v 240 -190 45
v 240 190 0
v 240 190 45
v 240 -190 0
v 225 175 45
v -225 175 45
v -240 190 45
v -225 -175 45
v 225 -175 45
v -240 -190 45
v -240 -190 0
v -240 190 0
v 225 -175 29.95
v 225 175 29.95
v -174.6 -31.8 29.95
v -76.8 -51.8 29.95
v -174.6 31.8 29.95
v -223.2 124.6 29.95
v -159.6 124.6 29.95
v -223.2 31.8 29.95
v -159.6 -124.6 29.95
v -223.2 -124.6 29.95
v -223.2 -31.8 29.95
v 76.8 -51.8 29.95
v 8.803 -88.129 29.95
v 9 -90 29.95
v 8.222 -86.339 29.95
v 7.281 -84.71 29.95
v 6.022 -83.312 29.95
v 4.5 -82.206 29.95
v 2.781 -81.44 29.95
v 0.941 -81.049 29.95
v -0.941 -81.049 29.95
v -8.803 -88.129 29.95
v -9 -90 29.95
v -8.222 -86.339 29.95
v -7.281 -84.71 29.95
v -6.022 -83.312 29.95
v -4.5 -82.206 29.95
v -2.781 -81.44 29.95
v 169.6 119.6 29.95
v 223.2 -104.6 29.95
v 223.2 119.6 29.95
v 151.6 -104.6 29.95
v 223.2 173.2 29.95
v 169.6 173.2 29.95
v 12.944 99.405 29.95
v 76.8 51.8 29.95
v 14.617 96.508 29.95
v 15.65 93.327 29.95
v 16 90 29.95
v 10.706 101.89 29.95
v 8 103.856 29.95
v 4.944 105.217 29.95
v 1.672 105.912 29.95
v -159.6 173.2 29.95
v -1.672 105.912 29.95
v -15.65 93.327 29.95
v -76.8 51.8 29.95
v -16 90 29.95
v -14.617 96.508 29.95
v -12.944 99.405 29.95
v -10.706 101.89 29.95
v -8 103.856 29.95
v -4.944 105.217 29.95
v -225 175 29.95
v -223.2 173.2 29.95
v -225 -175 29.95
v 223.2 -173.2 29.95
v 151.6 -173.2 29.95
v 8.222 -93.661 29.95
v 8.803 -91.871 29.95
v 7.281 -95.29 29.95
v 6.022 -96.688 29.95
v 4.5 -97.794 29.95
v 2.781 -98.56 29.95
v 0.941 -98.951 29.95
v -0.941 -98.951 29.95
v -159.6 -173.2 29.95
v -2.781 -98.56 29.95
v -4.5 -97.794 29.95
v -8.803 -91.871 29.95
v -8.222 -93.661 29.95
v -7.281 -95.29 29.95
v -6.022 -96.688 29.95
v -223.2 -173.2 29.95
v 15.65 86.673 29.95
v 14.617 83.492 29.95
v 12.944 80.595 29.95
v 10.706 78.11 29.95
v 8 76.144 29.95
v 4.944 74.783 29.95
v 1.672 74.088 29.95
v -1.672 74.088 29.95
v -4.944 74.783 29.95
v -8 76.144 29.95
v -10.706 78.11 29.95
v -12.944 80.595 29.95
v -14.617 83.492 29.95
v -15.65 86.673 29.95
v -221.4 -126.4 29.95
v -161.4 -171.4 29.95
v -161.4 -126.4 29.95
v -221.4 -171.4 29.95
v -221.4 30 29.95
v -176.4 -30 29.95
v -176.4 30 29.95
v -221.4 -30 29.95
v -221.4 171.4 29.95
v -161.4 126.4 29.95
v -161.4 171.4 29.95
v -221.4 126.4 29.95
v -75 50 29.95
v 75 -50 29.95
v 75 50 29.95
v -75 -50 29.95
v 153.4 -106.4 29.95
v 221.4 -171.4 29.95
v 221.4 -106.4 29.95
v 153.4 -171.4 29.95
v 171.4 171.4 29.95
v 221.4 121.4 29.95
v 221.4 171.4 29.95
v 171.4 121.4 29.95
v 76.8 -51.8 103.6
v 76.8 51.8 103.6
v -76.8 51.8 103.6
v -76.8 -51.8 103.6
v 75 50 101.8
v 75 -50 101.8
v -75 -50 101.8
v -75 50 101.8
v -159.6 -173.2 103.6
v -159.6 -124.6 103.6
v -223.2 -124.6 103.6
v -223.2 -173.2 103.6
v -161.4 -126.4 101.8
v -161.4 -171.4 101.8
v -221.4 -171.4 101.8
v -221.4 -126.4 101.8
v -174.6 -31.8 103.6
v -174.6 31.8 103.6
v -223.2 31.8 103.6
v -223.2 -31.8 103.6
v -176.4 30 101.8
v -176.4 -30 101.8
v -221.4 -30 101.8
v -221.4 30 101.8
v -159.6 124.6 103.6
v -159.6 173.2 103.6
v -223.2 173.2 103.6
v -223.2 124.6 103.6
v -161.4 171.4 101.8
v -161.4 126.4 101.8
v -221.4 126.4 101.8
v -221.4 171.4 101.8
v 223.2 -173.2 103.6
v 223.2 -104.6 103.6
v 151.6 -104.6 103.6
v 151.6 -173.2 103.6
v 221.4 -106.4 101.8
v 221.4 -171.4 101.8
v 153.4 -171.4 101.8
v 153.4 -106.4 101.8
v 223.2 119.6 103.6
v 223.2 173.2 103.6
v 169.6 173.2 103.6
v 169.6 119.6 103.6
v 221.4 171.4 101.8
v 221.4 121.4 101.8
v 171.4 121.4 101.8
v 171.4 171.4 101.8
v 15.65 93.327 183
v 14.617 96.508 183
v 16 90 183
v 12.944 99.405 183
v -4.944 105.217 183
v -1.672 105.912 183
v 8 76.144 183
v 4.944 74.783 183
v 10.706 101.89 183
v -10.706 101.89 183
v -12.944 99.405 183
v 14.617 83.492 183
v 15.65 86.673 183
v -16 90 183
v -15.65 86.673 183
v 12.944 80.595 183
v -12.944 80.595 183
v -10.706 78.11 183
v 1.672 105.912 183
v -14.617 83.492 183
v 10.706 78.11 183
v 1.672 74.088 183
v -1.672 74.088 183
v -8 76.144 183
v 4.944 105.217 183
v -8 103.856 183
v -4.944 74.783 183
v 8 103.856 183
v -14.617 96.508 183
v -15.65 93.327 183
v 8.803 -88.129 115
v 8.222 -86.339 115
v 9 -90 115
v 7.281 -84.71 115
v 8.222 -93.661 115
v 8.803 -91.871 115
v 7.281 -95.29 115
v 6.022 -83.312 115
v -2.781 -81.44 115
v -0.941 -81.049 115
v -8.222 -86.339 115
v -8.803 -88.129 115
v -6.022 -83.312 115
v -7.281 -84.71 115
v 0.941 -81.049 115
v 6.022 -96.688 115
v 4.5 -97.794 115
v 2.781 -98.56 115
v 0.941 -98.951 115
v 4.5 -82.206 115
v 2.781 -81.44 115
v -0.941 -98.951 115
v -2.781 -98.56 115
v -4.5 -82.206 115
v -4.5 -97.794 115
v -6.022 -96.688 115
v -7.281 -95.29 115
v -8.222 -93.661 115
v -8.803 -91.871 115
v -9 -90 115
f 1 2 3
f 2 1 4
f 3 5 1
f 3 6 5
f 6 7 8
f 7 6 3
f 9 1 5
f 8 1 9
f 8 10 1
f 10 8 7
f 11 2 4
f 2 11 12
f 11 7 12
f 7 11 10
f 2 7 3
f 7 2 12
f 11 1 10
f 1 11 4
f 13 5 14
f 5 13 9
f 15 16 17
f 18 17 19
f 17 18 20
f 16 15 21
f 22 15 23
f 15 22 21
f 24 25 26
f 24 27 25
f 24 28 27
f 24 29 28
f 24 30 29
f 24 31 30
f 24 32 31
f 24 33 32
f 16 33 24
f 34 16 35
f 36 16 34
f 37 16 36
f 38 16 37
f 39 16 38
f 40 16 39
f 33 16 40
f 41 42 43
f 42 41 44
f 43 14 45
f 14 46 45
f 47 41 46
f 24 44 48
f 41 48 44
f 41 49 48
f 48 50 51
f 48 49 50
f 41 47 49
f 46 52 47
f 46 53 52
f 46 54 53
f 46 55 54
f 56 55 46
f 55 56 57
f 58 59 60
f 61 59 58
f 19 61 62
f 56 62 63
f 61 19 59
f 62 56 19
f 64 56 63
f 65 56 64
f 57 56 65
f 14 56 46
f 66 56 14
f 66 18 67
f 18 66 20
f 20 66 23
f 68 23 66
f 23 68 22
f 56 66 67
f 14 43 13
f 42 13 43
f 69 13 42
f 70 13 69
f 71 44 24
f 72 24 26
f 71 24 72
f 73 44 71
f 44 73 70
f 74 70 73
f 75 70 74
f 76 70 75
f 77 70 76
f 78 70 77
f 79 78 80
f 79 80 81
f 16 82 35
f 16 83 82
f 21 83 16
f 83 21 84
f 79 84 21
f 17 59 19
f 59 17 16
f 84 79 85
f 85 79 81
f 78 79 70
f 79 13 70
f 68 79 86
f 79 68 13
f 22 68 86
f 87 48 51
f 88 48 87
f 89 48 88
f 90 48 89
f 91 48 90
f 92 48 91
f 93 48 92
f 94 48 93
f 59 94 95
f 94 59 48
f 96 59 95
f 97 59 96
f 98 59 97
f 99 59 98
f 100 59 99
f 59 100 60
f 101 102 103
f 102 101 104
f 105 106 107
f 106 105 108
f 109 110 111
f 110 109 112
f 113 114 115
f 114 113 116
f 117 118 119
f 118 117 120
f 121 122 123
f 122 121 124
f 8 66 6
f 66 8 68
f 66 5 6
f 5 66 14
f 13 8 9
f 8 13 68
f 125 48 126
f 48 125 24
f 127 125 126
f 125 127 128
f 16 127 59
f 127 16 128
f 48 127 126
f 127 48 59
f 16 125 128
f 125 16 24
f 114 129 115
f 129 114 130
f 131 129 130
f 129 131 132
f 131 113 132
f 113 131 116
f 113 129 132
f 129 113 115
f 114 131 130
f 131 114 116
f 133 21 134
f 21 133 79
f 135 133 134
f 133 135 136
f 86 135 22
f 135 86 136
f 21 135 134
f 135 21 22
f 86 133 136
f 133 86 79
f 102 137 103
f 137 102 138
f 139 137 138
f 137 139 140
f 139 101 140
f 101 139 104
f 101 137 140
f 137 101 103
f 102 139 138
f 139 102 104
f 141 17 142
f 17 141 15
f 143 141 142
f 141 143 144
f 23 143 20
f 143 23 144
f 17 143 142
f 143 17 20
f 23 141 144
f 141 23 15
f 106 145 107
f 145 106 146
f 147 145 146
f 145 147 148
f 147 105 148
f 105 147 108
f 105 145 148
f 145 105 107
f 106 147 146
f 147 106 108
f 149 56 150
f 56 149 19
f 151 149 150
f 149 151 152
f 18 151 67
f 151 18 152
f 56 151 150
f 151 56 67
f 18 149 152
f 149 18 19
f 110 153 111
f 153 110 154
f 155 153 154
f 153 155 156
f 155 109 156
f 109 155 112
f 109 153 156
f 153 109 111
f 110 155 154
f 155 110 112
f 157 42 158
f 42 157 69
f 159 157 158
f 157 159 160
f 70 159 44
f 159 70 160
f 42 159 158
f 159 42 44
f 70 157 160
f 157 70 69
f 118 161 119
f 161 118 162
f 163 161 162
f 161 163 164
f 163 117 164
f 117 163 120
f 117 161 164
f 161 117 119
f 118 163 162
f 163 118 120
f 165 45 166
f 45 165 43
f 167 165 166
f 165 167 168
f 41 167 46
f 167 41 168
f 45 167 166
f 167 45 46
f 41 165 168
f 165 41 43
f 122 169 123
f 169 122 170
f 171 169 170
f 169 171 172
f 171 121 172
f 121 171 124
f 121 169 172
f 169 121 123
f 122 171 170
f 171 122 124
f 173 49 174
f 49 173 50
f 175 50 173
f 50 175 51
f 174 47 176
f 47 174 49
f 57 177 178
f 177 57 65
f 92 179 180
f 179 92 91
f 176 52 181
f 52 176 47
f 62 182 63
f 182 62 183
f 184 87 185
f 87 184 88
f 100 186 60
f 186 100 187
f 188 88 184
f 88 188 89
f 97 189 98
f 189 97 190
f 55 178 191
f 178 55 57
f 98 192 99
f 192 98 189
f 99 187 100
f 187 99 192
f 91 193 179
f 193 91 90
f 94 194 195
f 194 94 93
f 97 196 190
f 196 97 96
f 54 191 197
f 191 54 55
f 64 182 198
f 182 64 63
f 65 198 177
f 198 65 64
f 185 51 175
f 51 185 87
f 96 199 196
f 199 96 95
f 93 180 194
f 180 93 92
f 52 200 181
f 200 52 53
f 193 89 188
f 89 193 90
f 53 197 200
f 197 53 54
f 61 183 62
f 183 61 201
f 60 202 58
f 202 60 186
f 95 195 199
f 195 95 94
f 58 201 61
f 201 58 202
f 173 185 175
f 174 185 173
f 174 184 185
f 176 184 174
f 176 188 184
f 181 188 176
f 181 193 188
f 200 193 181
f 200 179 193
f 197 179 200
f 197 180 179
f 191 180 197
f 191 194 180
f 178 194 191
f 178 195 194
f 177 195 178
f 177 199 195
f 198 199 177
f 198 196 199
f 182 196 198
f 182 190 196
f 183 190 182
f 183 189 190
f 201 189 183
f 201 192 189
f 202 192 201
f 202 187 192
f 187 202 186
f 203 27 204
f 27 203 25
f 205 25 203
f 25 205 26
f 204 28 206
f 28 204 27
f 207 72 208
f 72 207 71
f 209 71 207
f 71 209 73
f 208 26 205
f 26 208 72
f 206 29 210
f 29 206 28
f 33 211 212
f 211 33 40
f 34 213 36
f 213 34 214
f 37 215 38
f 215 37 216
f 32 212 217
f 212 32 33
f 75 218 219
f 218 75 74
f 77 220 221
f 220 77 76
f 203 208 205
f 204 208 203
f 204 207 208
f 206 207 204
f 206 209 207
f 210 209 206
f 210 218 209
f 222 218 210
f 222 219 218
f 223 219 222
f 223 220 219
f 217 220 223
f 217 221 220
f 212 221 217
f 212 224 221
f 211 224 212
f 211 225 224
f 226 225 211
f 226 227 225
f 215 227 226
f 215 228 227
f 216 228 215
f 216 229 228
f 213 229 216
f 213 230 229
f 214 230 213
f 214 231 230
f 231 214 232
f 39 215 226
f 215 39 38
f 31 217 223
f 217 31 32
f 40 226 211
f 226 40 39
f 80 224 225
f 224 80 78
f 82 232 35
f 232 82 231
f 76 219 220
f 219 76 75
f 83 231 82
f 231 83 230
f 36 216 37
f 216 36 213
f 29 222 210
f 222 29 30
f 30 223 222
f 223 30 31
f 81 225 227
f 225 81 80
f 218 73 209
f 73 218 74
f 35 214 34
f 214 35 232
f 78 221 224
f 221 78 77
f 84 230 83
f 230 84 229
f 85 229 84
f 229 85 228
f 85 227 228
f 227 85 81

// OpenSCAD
scaleFactor = 10;

roomWidth = 3500;
roomLength = 4500;
roomHeight = 150;
roomWallThickness = 150;

module box(width, length, height, wallThickness, open = "top") {    
    // inner core in the center, equals to open == "none"
    innerHeight = open == "bottom" ? height+1 : (open == "top" ? height+1 : height);
    innerZ = open == "bottom" ? -wallThickness : (open == "top" ? wallThickness : 0);

    translate([0, 0, height / 2 + wallThickness])
    difference() {
        cube(size = [length + 2 * wallThickness, width + 2 * wallThickness, height + 2 * wallThickness], center = true);
        translate([0, 0, innerZ])
            cube(size = [length, width, innerHeight], center = true);
    }
}

scale([1 / scaleFactor, 1 / scaleFactor, 1 / scaleFactor]) {
    // room
    box(width = roomWidth, length = roomLength, height = roomHeight, wallThickness = roomWallThickness);

    // workbench in the middle
    box(width = 1000, length = 1500, height = 1000, wallThickness = 18, open = "none" );

    // Sharping station
    boxWidth = 450;
    boxLength = 600;
    boxWallThickness = 18;
    totallyRight = roomWidth / 2 - boxWidth / 2 - 2 * boxWallThickness;
    tottalyFront = roomLength / 2 - boxLength / 2 - 2 * boxWallThickness;
    translate([-tottalyFront, -totallyRight, 0]) box(width = boxWidth, length = boxLength, height = 1000, wallThickness = boxWallThickness, open = "none" );

    // Drill station
    boxWidth1 = 600;
    boxLength1 = 450;
    boxWallThickness1 = 18;
    totallyRight1 = roomWidth / 2 - boxWidth1 / 2 - 2 * boxWallThickness1;
    tottalyFront1 = roomLength / 2 - boxLength1 / 2 - 2 * boxWallThickness1;
    translate([-tottalyFront1, 0, 0]) box(width = boxWidth1, length = boxLength1, height = 1000, wallThickness = boxWallThickness1, open = "none" );

    // Mitre station
    boxWidth2 = 450;
    boxLength2 = 600;
    boxWallThickness2 = 18;
    totallyRight2 = roomWidth / 2 - boxWidth2 / 2 - 2 * boxWallThickness2;
    tottalyFront2 = roomLength / 2 - boxLength2 / 2 - 2 * boxWallThickness2;
    translate([-tottalyFront2, totallyRight2, 0]) box(width = boxWidth2, length = boxLength2, height = 1000, wallThickness = boxWallThickness2, open = "none" );

    // Saw station
    boxWidth3 = 650;
    boxLength3 = 680;
    boxWallThickness3 = 18;
    totallyRight3 = roomWidth / 2 - boxWidth3 / 2 - 2 * boxWallThickness3;
    tottalyFront3 = roomLength / 2 - boxLength3 / 2 - 2 * boxWallThickness3;
    translate([tottalyFront3, -totallyRight3, 0]) box(width = boxWidth3, length = boxLength3, height = 1000, wallThickness = boxWallThickness3, open = "none" );

    // Dust station
    boxWidth4 = 500;
    boxLength4 = 500;
    boxWallThickness4 = 18;
    totallyRight4 = roomWidth / 2 - boxWidth4 / 2 - 2 * boxWallThickness4;
    tottalyFront4 = roomLength / 2 - boxLength4 / 2 - 2 * boxWallThickness4;
    translate([tottalyFront4, totallyRight4, 0]) box(width = boxWidth4, length = boxLength4, height = 1000, wallThickness = boxWallThickness4, open = "none" );
    




    // Fat Boy
    translate([0, 900, 0]) cylinder(d=320,h=1830);
    // Lil Girl
    translate([0, -900, 0]) cylinder(d=180,h=1150);
}
